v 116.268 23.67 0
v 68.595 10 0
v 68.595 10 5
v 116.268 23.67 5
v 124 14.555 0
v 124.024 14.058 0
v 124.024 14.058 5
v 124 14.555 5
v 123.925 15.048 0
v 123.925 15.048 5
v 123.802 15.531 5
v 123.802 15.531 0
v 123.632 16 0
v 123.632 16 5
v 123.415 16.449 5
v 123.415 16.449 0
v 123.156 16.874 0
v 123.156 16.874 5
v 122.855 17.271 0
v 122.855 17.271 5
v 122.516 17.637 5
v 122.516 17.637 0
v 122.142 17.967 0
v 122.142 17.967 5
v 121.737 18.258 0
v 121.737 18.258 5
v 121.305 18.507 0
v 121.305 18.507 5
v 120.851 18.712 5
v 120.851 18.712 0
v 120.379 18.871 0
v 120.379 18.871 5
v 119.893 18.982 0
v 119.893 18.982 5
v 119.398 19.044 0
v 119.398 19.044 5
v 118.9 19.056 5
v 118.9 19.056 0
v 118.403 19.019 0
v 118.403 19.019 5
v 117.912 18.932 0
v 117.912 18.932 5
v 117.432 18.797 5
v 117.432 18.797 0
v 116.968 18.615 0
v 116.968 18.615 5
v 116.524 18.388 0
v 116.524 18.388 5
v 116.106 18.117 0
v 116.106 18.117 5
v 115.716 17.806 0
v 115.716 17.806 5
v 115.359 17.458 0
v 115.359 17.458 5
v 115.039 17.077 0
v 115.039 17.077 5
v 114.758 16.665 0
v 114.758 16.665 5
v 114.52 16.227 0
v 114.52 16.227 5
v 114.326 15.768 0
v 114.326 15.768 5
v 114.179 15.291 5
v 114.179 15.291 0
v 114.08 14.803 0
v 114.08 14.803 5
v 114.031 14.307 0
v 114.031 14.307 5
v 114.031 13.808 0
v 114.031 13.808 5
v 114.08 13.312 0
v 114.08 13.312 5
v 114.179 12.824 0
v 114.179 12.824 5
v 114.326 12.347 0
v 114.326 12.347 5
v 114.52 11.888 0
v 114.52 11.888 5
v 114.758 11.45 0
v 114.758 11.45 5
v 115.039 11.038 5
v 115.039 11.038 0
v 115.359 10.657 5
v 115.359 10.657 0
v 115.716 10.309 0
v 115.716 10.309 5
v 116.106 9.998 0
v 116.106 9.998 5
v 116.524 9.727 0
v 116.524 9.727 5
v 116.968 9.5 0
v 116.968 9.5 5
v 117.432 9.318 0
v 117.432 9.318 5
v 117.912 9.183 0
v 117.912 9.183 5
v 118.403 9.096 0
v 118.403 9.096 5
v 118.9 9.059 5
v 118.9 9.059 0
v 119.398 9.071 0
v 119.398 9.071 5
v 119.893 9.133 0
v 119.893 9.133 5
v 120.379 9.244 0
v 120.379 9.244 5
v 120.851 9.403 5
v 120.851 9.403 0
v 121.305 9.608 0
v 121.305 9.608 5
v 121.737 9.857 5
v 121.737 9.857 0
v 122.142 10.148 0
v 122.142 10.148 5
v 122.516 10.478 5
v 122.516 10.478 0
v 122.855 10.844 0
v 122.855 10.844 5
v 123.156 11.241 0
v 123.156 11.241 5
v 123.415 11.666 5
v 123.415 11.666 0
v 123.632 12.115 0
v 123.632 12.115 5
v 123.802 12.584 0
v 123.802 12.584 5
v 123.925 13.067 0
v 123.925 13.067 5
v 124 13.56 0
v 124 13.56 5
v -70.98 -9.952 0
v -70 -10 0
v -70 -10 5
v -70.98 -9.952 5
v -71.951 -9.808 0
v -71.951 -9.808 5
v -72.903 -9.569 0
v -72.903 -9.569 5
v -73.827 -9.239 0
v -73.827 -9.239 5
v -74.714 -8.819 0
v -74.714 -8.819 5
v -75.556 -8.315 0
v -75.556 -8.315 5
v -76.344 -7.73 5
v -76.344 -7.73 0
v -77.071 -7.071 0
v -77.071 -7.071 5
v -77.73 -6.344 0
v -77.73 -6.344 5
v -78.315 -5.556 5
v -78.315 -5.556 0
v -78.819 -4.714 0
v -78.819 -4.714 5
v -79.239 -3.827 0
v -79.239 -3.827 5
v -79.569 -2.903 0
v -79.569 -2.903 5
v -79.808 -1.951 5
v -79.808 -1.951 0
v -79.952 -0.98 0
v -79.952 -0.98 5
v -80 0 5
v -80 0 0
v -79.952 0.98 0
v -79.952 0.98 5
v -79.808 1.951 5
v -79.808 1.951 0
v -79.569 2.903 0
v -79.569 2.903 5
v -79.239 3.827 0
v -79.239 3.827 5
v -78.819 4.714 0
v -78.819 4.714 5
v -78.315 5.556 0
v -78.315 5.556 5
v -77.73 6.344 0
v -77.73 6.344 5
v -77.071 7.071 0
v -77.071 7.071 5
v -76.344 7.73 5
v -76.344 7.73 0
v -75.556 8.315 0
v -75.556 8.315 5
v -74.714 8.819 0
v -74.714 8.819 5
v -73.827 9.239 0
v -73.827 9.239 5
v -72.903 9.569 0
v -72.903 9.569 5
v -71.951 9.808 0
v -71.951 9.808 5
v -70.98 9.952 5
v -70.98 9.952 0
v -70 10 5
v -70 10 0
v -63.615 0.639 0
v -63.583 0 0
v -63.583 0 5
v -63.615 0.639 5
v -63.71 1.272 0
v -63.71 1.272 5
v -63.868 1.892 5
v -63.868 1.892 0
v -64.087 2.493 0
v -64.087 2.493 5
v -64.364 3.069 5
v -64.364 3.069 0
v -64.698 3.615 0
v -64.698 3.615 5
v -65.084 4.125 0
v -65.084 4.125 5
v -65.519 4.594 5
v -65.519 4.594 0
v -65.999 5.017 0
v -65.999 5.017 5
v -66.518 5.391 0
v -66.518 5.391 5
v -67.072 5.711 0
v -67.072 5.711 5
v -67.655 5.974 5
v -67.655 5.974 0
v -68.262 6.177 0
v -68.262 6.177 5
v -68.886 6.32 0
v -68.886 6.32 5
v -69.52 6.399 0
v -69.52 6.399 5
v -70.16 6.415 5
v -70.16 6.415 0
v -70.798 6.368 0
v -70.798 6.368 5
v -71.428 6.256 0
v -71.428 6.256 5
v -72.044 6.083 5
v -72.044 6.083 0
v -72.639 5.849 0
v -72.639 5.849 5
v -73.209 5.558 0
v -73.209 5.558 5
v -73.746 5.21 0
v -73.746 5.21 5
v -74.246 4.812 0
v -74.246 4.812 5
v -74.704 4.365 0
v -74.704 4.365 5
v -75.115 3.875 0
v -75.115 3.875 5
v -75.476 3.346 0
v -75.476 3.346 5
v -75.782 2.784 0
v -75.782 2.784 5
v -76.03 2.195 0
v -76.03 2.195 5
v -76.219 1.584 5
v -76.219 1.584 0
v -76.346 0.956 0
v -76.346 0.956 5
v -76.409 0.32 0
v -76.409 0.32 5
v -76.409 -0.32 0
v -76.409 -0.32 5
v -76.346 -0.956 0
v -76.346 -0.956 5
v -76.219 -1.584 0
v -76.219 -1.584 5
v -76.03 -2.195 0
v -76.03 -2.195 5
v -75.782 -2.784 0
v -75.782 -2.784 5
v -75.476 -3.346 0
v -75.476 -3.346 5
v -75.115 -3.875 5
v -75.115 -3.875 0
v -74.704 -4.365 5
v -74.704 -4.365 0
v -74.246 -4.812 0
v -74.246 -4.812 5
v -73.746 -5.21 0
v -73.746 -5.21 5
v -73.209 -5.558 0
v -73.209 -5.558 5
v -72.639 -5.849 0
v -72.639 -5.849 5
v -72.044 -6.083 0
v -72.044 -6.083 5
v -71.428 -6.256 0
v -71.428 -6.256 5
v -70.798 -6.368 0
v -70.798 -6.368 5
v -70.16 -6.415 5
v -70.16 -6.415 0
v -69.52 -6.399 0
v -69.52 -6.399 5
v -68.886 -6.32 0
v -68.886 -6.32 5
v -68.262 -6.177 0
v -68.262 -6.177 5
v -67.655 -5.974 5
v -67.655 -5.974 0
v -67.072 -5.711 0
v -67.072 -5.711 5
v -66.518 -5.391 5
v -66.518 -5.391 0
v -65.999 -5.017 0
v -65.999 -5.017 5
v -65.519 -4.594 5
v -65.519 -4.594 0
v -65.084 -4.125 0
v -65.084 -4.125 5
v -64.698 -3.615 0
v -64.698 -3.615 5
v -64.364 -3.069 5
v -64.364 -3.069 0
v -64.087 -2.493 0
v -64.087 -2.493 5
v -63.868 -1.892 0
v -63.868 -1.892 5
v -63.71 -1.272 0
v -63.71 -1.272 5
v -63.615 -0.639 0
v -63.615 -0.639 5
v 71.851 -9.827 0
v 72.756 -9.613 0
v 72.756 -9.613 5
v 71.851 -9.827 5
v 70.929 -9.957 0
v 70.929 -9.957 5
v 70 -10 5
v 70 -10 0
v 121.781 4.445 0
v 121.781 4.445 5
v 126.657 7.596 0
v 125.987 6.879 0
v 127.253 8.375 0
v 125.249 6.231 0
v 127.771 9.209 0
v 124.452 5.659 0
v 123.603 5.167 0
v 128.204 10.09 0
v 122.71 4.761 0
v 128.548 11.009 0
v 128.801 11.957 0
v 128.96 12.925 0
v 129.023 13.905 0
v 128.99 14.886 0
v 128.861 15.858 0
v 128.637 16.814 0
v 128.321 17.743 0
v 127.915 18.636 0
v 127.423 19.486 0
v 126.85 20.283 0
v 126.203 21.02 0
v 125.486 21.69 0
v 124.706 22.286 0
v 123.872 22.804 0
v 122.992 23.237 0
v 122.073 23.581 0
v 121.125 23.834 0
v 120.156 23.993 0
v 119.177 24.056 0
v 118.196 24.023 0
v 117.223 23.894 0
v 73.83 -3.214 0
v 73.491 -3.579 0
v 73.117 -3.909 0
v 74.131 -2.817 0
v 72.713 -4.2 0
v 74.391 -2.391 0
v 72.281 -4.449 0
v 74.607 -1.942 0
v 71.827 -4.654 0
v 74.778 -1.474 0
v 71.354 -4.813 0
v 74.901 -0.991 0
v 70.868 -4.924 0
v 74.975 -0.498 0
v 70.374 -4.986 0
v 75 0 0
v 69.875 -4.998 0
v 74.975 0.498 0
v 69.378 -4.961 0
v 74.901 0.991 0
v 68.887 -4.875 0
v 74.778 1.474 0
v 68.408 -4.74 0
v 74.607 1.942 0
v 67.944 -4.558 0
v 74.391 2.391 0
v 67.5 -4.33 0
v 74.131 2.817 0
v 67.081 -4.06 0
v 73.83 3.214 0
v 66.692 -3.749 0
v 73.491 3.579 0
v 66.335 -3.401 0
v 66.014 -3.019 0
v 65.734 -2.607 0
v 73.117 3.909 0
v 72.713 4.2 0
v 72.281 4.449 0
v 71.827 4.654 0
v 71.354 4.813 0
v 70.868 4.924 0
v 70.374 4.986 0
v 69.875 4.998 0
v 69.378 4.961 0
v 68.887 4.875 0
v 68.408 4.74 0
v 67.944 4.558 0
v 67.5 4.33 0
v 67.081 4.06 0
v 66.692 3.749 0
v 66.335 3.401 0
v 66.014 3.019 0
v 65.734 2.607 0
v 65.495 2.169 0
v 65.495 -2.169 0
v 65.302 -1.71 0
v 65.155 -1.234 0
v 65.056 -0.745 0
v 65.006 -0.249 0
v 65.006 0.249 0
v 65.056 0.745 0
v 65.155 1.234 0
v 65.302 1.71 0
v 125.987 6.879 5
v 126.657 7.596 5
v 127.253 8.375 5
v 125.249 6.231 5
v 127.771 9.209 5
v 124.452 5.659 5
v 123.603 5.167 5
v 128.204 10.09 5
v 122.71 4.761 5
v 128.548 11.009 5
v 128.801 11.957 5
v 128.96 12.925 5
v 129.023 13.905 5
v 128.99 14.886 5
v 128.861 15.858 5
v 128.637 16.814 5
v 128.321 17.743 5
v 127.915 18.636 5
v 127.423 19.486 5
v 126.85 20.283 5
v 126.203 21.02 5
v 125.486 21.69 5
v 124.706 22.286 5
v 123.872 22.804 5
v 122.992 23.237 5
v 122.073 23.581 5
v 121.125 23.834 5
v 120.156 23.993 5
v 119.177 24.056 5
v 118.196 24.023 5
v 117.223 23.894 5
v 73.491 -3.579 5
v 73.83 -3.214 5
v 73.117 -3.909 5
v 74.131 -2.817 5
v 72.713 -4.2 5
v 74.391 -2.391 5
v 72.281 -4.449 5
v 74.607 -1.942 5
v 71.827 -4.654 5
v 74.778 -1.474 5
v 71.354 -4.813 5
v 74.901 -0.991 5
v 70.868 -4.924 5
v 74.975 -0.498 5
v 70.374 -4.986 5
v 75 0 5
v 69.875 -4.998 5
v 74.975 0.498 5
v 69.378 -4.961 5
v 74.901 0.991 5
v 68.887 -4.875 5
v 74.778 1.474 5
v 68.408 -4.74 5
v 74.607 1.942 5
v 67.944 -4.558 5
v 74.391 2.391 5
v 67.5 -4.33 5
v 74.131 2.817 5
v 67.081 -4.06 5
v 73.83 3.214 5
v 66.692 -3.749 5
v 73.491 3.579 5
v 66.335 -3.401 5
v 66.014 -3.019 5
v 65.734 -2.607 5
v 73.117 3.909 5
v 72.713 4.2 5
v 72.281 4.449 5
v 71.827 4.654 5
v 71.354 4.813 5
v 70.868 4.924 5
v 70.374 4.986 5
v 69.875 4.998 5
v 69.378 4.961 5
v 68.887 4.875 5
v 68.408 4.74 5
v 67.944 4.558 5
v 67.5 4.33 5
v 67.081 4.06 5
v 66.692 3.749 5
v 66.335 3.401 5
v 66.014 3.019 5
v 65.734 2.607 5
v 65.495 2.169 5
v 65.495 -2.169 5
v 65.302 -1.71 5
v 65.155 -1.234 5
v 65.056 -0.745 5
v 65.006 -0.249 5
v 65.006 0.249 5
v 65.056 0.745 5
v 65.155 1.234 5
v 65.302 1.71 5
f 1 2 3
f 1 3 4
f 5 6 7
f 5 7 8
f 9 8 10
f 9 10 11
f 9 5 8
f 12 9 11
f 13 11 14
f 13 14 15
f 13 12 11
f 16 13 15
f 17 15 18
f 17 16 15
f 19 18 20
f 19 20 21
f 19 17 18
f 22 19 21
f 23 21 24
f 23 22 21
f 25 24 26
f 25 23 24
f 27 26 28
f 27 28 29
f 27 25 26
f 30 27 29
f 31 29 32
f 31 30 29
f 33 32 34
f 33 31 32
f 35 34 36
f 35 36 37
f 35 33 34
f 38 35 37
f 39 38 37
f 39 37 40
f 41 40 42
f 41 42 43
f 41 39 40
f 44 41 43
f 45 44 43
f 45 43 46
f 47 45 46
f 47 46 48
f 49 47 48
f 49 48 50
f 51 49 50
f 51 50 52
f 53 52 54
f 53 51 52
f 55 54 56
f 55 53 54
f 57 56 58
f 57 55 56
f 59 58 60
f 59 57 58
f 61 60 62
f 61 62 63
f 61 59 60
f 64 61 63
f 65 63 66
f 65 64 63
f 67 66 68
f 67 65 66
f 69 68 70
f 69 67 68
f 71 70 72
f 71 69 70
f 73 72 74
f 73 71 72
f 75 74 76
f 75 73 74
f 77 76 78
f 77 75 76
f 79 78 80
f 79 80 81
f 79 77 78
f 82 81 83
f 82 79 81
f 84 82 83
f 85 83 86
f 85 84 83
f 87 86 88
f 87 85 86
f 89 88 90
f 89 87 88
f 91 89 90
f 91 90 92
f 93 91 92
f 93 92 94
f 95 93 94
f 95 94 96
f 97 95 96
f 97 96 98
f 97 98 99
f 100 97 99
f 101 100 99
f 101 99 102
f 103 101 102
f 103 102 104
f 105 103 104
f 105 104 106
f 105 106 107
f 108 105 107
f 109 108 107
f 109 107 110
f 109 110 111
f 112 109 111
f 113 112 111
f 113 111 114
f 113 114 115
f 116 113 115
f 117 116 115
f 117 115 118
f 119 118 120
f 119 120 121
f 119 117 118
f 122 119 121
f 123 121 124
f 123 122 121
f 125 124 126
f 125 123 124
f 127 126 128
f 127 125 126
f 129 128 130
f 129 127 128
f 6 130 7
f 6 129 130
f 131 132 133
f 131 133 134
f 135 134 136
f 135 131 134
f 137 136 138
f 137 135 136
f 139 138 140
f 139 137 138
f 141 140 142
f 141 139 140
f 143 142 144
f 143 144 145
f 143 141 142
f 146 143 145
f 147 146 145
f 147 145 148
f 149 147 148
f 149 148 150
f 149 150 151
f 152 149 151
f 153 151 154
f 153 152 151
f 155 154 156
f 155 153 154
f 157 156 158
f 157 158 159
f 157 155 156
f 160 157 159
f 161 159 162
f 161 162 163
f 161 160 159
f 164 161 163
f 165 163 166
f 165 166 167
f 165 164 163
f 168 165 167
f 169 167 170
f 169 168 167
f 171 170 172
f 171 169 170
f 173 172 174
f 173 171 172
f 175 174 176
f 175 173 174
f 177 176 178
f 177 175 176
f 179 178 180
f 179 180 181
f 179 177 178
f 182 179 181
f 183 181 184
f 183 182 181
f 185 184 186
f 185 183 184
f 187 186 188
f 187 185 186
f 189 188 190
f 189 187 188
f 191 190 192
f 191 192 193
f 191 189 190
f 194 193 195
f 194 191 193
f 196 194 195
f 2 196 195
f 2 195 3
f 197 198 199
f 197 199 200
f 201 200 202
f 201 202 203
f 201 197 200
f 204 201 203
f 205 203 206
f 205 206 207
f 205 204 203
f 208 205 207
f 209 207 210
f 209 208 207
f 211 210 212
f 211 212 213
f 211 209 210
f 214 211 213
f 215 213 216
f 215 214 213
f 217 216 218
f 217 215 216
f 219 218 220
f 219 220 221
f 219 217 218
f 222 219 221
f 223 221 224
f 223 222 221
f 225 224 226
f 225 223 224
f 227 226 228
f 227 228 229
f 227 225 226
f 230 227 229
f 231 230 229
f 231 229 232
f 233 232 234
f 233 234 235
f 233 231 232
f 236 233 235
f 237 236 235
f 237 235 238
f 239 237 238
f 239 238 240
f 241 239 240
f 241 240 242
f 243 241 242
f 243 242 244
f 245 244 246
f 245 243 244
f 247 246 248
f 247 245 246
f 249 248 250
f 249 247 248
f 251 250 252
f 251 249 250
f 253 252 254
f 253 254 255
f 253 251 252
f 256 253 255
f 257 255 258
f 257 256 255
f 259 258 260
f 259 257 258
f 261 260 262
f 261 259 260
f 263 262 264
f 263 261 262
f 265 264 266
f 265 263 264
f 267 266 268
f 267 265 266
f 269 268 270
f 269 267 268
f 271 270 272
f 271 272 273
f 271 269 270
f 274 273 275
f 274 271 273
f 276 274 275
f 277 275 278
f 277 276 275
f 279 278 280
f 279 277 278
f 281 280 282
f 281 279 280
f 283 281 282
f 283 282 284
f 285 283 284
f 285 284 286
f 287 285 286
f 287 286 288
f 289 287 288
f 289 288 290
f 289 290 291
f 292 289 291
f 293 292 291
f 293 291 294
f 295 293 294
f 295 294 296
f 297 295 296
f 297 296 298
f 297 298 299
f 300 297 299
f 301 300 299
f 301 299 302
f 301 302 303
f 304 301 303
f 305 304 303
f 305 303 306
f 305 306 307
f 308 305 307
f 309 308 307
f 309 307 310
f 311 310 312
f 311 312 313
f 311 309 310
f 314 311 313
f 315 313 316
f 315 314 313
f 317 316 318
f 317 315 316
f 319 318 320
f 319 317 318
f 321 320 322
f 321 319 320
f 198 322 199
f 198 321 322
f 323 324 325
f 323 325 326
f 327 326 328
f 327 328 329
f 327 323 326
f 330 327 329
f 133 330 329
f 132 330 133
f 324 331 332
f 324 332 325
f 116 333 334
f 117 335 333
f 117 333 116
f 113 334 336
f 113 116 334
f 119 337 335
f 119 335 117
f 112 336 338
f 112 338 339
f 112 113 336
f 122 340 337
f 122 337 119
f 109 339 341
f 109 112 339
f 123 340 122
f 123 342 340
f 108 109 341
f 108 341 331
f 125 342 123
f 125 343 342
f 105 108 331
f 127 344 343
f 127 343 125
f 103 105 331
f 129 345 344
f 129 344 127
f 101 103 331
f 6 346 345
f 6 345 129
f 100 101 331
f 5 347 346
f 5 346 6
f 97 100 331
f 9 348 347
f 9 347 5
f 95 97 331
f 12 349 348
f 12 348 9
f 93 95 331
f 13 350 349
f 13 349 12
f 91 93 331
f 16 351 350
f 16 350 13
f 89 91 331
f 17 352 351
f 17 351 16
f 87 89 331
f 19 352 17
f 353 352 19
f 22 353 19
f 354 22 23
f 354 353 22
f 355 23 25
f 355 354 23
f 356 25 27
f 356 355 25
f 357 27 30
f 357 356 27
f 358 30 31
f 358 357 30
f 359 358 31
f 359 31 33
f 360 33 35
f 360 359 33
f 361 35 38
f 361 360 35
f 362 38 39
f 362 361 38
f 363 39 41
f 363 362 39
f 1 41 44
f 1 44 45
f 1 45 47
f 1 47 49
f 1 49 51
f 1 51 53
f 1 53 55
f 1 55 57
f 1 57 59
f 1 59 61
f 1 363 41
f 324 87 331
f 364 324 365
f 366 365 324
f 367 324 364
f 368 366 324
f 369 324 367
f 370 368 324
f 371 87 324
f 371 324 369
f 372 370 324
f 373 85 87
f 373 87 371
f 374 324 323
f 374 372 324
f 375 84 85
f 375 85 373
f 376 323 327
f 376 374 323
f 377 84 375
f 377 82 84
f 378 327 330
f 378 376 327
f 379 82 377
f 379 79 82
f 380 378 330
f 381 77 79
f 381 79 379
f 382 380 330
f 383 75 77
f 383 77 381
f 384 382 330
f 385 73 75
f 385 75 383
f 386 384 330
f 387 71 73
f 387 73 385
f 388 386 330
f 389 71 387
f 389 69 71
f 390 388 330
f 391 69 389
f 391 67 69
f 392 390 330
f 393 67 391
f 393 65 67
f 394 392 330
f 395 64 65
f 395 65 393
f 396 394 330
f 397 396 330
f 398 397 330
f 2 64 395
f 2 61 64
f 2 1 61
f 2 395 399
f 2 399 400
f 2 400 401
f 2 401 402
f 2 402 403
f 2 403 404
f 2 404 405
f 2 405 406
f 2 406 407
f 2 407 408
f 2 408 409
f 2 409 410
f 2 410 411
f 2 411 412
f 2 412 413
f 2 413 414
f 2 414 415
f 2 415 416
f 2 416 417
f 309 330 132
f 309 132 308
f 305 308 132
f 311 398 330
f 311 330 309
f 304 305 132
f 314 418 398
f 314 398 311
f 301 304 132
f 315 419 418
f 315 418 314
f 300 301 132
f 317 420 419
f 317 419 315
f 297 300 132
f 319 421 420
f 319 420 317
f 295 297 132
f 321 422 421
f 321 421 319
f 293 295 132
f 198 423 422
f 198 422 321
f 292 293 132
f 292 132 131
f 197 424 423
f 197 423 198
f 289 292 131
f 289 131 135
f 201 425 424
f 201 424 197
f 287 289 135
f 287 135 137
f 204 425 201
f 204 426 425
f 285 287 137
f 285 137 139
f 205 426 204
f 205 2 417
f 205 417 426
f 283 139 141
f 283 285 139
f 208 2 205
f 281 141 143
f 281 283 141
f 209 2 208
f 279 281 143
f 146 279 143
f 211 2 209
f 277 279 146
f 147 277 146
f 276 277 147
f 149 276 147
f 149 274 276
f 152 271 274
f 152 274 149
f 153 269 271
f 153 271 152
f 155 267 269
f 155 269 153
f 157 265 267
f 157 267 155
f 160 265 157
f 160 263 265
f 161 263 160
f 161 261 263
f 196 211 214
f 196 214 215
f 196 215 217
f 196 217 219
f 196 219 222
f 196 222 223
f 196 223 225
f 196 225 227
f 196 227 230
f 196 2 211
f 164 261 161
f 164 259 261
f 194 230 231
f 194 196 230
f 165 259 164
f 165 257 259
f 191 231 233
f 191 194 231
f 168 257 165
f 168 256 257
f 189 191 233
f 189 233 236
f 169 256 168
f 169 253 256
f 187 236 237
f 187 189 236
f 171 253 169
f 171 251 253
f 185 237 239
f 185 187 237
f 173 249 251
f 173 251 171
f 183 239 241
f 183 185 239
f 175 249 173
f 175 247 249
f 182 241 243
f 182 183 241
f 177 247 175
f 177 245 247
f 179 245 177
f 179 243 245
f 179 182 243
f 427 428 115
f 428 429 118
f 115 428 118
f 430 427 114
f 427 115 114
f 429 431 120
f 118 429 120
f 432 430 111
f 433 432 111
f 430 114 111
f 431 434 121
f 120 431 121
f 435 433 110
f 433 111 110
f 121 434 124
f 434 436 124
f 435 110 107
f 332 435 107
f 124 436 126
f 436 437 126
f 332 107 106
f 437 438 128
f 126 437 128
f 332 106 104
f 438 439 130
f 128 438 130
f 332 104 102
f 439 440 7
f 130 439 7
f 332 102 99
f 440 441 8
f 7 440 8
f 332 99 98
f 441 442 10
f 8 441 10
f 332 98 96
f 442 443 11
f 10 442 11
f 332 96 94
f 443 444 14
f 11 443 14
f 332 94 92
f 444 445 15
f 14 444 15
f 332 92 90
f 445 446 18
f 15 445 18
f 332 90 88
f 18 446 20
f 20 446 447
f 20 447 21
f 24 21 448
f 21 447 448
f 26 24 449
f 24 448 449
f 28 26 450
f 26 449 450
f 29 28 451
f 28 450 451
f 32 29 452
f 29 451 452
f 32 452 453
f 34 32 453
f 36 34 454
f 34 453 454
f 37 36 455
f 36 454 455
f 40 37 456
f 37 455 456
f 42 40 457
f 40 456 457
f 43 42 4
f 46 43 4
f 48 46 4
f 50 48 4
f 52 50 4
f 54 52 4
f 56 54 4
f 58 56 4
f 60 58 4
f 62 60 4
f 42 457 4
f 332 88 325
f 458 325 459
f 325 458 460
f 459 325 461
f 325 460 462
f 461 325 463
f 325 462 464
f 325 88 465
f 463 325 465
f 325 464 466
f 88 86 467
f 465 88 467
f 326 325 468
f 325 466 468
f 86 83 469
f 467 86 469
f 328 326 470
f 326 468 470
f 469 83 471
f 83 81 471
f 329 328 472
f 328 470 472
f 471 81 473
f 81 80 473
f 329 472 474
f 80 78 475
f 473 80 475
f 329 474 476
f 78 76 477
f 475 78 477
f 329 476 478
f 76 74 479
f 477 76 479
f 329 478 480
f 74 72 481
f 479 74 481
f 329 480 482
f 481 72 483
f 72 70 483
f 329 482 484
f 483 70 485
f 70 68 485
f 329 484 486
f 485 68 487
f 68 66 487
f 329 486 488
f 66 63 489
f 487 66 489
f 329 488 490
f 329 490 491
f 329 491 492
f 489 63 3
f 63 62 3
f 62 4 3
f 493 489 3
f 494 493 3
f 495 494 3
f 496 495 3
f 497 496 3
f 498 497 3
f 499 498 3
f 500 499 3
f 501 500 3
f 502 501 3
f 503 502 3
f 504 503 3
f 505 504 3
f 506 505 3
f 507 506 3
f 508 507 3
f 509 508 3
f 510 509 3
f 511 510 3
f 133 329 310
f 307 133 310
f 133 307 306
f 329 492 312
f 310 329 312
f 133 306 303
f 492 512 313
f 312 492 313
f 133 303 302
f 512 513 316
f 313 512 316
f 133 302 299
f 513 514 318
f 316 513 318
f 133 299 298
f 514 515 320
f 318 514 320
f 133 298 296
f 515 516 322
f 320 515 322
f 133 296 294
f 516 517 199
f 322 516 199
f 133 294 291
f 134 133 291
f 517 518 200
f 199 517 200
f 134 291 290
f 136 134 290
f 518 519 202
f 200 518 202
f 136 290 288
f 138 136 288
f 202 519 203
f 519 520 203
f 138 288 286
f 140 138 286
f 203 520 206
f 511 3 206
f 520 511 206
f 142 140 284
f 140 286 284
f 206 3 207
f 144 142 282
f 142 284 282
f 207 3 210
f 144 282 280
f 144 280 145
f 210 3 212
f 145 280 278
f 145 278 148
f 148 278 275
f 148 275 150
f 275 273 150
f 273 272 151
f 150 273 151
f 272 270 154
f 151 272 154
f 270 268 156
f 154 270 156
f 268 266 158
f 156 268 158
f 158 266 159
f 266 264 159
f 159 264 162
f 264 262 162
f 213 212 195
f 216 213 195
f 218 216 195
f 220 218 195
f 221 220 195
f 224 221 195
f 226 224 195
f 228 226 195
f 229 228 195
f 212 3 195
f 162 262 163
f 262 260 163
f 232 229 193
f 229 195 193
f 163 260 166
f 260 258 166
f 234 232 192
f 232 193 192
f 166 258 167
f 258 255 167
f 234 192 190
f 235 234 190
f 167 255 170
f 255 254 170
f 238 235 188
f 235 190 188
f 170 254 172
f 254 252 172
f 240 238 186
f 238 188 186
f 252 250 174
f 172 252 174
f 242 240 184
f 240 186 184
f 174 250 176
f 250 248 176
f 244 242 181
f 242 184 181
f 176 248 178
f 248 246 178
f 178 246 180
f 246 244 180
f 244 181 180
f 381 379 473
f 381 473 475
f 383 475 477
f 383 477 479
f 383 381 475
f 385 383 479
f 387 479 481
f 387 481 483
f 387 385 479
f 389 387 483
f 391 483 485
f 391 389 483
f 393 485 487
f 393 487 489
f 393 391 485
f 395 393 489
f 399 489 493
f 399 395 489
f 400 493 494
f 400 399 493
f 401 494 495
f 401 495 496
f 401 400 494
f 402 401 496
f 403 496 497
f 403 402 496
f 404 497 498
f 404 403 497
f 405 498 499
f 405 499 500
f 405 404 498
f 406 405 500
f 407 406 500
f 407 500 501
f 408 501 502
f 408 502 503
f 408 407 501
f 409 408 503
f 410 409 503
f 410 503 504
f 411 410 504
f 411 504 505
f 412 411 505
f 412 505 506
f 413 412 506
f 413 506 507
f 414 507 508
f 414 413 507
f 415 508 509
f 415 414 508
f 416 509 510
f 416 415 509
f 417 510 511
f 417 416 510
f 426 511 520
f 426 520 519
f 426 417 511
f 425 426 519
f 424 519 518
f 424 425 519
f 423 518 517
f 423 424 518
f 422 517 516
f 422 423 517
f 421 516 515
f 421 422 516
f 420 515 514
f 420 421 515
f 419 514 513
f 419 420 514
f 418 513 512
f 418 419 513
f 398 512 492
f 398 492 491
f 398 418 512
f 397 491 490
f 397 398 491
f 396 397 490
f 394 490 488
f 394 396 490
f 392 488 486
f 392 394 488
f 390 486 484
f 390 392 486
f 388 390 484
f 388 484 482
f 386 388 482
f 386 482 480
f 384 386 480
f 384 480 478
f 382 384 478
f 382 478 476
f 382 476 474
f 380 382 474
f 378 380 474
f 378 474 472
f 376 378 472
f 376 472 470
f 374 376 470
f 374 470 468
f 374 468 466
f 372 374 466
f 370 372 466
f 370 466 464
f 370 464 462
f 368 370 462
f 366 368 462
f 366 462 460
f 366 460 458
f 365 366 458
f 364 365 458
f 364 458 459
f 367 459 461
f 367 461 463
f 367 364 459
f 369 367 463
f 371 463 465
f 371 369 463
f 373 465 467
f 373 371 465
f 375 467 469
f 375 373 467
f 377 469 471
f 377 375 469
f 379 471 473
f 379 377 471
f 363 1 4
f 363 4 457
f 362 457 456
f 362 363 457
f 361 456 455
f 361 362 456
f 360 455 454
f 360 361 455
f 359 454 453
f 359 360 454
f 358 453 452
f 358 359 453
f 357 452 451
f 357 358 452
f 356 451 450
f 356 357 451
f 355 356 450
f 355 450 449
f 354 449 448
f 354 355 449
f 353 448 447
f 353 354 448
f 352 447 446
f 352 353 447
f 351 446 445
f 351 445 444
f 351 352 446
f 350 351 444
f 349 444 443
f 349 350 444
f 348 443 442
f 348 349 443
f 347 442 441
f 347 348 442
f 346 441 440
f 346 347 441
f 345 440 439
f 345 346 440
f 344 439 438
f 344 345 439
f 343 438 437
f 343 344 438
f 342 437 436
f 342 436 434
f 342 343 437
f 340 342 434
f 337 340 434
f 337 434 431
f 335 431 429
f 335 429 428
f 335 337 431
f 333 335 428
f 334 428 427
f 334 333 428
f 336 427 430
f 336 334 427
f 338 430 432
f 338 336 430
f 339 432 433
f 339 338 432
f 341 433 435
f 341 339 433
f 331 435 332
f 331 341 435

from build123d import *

# Parameters (mm, degrees)
CROQUIS1_R              = 5
CROQUIS1_R_2            = 6.417351574
SALIENTE_EXTRUIR1_DEPTH = 5


with BuildPart() as part:
    # Croquis1 → Saliente-Extruir1 (new body)
    with BuildSketch(Plane.XY):
        with BuildLine():
            Line((-70, 10), (68.594591653, 10))
            Line((68.594591653, 10), (116.267972935, 23.670122106))
            ThreePointArc((116.267972935, 23.670122106), (128.636963452, 16.813878705), (121.780720051, 4.444888187))
            Line((121.780720051, 4.444888187), (72.756373558, -9.612616959))
            ThreePointArc((72.756373558, -9.612616959), (71.39173101, -9.902680687), (70, -10))
            Line((70, -10), (-70, -10))
            ThreePointArc((-70, -10), (-80, 0), (-70, 10))
        make_face()
        with Locations((70, 0)):
            Circle(CROQUIS1_R, mode=Mode.SUBTRACT)
        with Locations((119.024346493, 14.057505147)):
            Circle(CROQUIS1_R, mode=Mode.SUBTRACT)
        with Locations((-70, 0)):
            Circle(CROQUIS1_R_2, mode=Mode.SUBTRACT)
    extrude(amount=SALIENTE_EXTRUIR1_DEPTH)


solid = part.part
